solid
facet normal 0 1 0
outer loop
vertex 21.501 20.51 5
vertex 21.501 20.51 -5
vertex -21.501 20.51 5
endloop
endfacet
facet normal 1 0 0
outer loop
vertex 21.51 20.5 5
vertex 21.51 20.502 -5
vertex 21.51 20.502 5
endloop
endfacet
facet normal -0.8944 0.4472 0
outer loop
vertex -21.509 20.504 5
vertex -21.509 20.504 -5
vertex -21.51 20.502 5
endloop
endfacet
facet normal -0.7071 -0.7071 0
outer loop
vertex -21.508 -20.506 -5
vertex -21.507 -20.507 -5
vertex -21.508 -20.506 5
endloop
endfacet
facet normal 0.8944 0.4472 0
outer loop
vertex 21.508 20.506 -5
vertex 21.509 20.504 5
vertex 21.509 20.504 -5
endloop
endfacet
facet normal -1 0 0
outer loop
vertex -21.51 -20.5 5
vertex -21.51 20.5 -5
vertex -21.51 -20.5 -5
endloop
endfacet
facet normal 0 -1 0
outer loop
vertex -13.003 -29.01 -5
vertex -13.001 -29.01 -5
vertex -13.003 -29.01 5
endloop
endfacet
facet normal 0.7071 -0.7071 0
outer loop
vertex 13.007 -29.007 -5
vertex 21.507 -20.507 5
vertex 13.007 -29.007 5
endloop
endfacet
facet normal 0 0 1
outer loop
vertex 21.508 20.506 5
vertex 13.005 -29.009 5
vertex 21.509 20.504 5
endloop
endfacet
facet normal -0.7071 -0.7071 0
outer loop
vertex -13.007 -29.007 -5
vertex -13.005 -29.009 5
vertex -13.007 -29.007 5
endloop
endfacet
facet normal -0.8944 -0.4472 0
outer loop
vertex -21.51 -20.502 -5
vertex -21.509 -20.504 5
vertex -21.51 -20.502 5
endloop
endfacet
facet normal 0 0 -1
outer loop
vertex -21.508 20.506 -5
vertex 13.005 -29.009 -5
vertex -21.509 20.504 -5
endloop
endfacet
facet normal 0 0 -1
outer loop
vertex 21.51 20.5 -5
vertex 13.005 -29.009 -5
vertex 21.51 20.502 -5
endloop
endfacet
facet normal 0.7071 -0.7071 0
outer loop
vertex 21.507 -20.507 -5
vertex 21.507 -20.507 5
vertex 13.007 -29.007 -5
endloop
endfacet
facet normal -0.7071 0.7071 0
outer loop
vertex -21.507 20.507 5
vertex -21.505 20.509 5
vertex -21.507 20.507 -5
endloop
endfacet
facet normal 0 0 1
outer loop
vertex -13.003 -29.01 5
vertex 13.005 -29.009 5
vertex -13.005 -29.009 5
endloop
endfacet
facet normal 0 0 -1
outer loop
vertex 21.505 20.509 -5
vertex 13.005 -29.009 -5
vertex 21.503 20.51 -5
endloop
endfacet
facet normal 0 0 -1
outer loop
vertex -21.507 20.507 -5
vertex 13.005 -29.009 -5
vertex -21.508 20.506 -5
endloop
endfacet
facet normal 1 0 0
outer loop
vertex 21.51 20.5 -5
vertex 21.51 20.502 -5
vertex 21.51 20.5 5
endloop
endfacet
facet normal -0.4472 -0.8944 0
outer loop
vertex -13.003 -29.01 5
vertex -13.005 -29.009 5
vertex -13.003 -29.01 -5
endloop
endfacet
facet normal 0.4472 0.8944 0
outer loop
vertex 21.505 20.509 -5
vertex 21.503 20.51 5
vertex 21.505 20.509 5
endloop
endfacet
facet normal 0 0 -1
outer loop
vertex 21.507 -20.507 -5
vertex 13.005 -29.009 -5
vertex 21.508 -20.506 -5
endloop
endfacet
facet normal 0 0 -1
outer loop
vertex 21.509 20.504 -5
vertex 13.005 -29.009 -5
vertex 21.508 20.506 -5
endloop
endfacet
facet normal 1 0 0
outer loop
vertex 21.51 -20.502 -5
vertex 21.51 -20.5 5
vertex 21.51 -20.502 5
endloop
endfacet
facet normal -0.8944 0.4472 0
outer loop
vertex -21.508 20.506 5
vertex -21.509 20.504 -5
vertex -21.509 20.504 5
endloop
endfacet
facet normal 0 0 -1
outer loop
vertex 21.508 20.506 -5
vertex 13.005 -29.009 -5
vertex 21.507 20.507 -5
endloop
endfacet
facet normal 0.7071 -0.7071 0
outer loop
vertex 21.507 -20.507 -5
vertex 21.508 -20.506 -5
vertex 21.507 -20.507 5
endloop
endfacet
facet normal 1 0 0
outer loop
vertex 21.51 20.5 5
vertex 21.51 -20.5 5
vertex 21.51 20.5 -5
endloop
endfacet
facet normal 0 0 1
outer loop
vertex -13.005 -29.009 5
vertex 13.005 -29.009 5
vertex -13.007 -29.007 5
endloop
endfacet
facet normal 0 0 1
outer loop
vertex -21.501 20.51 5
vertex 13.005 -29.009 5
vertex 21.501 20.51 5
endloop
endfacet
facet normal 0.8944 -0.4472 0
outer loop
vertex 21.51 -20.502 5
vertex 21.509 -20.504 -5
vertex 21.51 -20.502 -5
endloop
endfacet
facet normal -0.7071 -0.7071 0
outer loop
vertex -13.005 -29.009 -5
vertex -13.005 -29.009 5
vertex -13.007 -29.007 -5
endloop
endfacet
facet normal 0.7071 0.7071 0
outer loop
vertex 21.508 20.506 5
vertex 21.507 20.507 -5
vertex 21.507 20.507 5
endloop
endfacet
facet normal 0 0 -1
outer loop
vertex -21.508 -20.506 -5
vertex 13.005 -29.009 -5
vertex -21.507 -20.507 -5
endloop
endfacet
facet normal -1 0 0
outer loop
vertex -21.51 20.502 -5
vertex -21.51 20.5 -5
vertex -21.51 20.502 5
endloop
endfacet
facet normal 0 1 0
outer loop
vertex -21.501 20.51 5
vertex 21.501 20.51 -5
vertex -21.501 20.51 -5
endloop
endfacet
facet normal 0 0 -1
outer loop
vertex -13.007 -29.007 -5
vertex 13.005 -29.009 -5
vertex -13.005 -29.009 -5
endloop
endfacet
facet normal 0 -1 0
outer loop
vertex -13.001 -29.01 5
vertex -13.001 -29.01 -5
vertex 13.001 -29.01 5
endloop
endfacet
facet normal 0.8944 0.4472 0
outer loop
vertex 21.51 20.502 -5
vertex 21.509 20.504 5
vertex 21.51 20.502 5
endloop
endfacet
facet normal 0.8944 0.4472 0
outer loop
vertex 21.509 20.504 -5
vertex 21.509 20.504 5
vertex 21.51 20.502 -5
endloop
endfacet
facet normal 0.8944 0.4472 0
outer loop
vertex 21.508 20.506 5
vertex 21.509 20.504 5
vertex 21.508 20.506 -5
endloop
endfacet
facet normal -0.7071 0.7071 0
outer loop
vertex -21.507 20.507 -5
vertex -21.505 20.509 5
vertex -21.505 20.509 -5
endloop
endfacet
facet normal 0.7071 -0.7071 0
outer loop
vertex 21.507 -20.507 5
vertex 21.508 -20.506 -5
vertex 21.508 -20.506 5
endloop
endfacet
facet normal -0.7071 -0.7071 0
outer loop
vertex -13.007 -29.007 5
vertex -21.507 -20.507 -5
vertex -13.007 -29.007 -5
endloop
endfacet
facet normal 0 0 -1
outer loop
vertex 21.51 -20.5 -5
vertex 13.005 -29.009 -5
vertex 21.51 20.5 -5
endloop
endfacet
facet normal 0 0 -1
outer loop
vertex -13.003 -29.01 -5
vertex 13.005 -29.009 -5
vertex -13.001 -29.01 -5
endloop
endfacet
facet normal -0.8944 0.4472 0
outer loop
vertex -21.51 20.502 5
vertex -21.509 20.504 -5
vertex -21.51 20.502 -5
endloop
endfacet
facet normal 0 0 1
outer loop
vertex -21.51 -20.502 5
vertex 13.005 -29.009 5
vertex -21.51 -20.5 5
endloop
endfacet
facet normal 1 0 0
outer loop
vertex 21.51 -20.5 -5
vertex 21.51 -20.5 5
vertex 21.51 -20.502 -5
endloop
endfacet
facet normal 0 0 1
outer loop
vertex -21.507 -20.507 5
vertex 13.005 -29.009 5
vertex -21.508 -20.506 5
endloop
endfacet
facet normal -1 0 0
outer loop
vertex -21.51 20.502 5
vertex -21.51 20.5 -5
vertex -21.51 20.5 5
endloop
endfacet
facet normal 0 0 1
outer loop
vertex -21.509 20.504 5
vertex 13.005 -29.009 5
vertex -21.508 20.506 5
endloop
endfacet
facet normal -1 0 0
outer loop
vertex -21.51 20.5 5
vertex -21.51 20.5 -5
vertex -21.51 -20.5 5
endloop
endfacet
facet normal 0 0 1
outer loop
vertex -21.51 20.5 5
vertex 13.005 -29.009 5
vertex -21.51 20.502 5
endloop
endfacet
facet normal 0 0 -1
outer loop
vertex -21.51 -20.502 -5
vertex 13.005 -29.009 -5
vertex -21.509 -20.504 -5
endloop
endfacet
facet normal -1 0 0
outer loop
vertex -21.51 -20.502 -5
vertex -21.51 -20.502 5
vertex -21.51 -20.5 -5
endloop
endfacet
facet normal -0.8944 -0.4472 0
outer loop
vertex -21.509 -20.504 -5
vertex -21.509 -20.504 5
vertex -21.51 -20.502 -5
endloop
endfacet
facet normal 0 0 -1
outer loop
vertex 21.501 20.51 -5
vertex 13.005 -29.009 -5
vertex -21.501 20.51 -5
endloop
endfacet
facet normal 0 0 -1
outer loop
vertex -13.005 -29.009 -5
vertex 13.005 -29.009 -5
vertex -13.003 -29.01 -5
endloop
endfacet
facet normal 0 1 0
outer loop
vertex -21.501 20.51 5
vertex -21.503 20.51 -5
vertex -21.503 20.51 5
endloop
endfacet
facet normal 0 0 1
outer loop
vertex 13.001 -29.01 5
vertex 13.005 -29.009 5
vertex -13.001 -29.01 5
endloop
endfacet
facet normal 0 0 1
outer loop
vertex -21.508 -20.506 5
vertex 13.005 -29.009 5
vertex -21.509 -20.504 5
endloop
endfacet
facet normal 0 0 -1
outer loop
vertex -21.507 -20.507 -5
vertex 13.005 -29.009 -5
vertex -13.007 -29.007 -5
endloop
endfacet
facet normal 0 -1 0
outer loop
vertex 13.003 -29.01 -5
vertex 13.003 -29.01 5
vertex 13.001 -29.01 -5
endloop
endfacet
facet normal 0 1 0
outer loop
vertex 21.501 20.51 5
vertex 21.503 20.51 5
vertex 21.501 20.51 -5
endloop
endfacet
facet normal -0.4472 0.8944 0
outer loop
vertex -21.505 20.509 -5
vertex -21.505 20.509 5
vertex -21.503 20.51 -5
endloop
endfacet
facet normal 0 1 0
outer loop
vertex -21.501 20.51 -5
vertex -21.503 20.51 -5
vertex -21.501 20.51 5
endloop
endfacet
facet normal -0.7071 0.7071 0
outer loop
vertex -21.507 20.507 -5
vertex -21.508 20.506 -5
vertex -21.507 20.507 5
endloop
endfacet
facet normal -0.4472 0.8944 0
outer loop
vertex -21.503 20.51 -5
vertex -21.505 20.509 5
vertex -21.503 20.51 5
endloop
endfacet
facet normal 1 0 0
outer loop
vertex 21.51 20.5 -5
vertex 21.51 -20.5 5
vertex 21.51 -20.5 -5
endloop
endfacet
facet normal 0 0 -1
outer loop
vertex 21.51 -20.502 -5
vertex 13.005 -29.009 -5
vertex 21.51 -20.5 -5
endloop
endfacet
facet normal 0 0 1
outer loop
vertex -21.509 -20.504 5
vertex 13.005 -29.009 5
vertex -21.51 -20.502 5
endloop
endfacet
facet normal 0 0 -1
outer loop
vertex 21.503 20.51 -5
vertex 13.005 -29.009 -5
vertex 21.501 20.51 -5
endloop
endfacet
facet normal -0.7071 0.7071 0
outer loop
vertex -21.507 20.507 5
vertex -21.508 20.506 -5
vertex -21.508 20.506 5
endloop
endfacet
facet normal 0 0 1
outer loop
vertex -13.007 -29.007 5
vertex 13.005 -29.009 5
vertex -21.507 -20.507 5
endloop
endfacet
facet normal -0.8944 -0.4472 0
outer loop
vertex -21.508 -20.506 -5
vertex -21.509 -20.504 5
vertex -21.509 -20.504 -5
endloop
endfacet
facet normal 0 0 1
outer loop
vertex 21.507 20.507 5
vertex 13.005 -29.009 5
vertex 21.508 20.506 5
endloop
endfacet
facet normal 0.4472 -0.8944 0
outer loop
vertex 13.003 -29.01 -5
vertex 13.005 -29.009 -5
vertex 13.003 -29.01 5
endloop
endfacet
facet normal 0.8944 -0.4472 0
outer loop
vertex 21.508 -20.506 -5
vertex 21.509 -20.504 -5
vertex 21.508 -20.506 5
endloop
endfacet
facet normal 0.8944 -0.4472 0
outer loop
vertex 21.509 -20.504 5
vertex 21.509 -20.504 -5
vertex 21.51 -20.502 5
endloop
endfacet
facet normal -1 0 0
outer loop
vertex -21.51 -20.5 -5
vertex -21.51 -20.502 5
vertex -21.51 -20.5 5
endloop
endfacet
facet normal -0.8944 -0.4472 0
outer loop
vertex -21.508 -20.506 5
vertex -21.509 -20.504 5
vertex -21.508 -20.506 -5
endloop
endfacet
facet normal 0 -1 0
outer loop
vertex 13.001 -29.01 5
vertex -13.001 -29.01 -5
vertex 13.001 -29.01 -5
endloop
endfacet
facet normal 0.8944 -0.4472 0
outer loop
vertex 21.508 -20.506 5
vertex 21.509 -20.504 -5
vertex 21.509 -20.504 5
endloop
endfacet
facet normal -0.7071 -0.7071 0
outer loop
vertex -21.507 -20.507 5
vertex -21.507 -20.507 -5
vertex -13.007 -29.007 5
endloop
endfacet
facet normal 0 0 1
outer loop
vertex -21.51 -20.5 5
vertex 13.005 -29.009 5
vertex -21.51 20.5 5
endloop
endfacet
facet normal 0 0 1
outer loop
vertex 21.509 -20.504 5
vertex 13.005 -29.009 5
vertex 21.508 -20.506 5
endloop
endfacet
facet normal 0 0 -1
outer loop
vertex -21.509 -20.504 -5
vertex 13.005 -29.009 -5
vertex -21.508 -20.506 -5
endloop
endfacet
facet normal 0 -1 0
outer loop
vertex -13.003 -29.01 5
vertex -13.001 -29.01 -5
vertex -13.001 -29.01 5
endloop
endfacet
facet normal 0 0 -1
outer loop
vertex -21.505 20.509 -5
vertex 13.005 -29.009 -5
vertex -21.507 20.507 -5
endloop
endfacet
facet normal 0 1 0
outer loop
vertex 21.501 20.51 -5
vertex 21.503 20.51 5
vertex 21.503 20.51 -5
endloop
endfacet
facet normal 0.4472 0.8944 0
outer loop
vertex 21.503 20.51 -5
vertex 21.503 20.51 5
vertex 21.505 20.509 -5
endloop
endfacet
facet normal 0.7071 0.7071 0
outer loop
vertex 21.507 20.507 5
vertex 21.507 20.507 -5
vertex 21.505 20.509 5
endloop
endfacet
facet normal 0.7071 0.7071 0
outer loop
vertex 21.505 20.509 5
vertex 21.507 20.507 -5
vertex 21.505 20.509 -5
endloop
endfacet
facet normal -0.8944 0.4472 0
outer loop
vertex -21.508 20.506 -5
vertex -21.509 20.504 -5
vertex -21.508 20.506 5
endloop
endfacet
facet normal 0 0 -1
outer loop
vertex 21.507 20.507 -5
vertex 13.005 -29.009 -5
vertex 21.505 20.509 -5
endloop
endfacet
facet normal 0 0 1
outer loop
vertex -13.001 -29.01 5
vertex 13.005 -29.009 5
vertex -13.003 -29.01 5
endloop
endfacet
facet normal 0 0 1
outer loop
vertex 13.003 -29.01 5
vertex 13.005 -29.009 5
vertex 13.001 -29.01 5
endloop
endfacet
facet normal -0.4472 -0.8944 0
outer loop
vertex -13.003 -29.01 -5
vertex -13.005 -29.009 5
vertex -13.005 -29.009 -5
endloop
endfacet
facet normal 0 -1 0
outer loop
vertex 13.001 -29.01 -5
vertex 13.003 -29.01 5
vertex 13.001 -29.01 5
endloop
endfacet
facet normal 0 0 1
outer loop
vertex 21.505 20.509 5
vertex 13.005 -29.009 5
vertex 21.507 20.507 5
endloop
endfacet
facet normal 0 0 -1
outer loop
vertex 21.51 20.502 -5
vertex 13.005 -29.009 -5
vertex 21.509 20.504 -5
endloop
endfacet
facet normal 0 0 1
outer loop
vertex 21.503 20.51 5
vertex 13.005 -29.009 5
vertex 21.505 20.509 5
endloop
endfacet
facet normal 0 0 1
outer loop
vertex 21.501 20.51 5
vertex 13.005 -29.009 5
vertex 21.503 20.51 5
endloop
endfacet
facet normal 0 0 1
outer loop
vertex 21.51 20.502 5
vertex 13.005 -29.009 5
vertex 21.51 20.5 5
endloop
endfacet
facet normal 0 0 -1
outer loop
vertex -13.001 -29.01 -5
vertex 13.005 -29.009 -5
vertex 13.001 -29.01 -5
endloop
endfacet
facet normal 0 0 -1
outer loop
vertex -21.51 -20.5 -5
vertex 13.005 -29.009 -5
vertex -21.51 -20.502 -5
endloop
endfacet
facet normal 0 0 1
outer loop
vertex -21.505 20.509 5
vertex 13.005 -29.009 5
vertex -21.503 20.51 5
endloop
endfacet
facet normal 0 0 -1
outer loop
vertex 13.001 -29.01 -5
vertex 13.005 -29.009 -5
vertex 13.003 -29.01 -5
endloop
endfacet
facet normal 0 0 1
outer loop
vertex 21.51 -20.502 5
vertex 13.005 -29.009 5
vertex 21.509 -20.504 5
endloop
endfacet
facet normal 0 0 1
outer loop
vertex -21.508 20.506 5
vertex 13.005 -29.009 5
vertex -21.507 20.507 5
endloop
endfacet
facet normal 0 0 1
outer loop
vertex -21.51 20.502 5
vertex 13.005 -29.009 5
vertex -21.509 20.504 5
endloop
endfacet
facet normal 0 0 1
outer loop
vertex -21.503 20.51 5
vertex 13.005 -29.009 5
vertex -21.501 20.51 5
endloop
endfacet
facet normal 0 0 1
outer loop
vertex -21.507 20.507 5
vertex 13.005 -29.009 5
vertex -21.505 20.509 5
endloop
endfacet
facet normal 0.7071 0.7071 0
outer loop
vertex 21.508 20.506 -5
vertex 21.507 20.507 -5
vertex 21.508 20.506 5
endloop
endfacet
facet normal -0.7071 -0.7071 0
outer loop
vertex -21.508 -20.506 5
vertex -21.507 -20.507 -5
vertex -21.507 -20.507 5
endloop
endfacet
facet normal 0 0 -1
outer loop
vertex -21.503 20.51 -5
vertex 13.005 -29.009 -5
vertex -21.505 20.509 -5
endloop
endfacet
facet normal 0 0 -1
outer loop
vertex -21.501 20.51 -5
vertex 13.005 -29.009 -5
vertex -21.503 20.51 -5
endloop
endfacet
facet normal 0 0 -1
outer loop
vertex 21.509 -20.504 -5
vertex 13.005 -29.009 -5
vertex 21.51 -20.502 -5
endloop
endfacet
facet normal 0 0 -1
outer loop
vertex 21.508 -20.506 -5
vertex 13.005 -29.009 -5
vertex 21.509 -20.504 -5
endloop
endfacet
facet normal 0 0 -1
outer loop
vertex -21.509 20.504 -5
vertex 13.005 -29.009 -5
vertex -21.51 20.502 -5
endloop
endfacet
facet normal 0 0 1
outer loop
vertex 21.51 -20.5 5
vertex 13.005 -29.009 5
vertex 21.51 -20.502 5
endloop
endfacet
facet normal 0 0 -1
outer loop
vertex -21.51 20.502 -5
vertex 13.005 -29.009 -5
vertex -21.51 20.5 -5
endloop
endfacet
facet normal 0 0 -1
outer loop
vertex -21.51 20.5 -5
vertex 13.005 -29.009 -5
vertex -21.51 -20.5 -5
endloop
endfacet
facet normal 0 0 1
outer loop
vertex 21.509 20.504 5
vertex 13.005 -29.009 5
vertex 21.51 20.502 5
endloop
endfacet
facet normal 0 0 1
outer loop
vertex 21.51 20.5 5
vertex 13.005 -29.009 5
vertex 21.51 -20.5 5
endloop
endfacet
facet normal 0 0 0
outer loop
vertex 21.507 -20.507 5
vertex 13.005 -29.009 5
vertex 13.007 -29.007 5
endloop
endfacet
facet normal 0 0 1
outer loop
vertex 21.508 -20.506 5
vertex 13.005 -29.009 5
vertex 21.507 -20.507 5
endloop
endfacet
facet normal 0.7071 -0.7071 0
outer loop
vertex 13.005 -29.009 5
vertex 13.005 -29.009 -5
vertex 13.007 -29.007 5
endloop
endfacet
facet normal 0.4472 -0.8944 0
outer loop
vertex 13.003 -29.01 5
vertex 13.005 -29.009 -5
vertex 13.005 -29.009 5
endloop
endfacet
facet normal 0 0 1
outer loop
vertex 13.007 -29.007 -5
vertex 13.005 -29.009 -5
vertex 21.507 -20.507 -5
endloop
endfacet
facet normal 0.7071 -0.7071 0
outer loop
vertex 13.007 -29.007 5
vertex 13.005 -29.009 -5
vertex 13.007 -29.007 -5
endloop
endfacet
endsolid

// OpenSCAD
height = 10;

center_square_length = 41;
center_square_width = 43;

bottom_trapozoid_long_width = center_square_width;
top_trapozoid_long_width = 26;
trapozoid_height = 8.5;


$fn=30;

hull(){
    box(center_square_width,center_square_length,height);
    translate([0,-((center_square_length/2)+(trapozoid_height/2)),0])
    trapozoid(bottom_trapozoid_long_width,top_trapozoid_long_width,trapozoid_height,height);
}

module box(width,length,height){
    translate([width/2,length/2,0])
    cylinder(h=height,r=0.01,center=true);
    translate([-width/2,length/2,0])
    cylinder(h=height,r=0.01,center=true);
    translate([width/2,-length/2,0])
    cylinder(h=height,r=0.01,center=true);
    translate([-width/2,-length/2,0])
    cylinder(h=height,r=0.01,center=true);
}

module trapozoid(btm_with,top_width,trp_height,height) {
    translate([btm_with/2,trp_height/2,0])
    cylinder(h=height,r=0.01,center=true);
    translate([-btm_with/2,trp_height/2,0])
    cylinder(h=height,r=0.01,center=true);

    translate([top_width/2,-trp_height/2,0])
    cylinder(h=height,r=0.01,center=true);
    translate([-top_width/2,-trp_height/2,0])
    cylinder(h=height,r=0.01,center=true);
}
